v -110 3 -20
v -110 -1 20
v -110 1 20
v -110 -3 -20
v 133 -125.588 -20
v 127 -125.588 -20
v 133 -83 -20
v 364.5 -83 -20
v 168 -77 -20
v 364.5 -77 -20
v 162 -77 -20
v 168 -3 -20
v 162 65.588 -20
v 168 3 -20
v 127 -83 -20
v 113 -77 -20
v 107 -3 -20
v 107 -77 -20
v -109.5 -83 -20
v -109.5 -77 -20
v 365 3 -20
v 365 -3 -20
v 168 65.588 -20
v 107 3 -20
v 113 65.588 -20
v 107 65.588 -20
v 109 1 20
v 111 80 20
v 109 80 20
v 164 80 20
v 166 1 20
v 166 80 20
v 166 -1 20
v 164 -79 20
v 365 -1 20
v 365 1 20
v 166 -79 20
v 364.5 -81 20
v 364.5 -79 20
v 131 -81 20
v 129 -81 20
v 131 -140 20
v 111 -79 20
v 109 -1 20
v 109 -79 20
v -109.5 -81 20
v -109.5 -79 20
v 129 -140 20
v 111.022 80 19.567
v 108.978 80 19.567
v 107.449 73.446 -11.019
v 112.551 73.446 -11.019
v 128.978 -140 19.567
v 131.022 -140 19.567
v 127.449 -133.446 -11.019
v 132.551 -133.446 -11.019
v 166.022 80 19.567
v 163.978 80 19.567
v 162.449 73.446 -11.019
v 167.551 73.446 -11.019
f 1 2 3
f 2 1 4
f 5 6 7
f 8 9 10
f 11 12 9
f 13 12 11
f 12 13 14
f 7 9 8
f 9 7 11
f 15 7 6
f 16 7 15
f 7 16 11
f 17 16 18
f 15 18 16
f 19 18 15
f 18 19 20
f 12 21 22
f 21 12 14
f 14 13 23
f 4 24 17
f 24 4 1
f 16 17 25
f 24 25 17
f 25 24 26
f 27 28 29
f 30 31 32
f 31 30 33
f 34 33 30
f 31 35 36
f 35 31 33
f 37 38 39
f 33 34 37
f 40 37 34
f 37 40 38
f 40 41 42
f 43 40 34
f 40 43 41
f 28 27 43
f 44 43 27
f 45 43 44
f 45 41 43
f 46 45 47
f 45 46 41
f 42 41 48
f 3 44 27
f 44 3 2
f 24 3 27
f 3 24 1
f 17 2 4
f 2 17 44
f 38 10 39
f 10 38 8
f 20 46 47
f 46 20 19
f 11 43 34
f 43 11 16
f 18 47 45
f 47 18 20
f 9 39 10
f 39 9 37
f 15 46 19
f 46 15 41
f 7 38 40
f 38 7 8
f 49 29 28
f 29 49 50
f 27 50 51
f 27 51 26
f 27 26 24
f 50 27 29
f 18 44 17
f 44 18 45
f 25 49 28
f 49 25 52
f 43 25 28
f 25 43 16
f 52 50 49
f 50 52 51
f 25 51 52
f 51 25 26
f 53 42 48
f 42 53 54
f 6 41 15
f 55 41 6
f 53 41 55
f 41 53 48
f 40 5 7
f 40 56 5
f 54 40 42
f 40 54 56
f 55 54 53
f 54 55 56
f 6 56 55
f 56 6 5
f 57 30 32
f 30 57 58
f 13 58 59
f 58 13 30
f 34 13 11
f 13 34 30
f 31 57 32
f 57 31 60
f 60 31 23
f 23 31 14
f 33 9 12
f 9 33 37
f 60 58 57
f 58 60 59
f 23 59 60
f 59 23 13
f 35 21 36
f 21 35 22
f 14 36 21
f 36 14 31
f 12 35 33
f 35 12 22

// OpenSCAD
module wedge(x, y, z0, z1) {
    angleZ = (z1 > y) ? acos(y / z1) : atan(z1 / y);
    translate([-x / 2, -y / 2, -(z0 + z1) / 2])
    difference() {
        cube([x, y, z0 + z1]);
        translate([0, 0, z0]) rotate([angleZ, 0, 0]) cube([x, y * 10, z1]);
    };
};

module divider(length, depth = 40, topWidth = 2, bottomWidth = 4) {
    rotate([-90, 0, 0])
        union() {
            translate([0, 0, (topWidth + bottomWidth) / 4]) wedge(length, depth, topWidth / 2, bottomWidth / 2);
            translate([0, 0, -(topWidth + bottomWidth) / 4]) rotate([0, 180, 0]) wedge(length, depth, topWidth / 2, bottomWidth / 2);
        }
};

module sideProfile(depth=40, maxDepth=70) {
    rotate([90, 180, -90])
        union() {
            wedge(10, maxDepth, 0, 15);
            translate([0, (maxDepth - 24) / 2, 3]) wedge(10, 24, 0, 21);
        };
};

module drawerDivider() {
    divider(220);
    translate([127.5, -80, 0]) divider(474);
    translate([110, 0, 0]) rotate([0, 0, 90]) difference() {
        divider(160);
        translate([79, 0, 14.9]) sideProfile();
    };
    translate([130, -110, 0]) rotate([0, 0, 90]) difference() {
        divider(60);
        translate([-29, 0, 14.9]) rotate([0, 0, 180]) sideProfile();
    };
    translate([165, 0, 0]) rotate([0, 0, 90]) difference() {
        divider(160);
        translate([79, 0, 14.9]) sideProfile();
    };
    translate([265, 0, 0]) divider(200);
};


module partOne() {
    intersection() {
        cube([220, 300, 40], center=true);
        drawerDivider();    
    };
};

module partTwo() {
    intersection() {
        difference() {
            cube([800, 300, 40], center=true);
            cube([330, 300, 40], center=true);
        };
        drawerDivider();    
    };
};

module partThree() {
    intersection() {
        translate([137.5, 0, 0]) cube([55, 400, 40], center=true);
        drawerDivider();    
    };
};

partOne();
partTwo();
partThree();
